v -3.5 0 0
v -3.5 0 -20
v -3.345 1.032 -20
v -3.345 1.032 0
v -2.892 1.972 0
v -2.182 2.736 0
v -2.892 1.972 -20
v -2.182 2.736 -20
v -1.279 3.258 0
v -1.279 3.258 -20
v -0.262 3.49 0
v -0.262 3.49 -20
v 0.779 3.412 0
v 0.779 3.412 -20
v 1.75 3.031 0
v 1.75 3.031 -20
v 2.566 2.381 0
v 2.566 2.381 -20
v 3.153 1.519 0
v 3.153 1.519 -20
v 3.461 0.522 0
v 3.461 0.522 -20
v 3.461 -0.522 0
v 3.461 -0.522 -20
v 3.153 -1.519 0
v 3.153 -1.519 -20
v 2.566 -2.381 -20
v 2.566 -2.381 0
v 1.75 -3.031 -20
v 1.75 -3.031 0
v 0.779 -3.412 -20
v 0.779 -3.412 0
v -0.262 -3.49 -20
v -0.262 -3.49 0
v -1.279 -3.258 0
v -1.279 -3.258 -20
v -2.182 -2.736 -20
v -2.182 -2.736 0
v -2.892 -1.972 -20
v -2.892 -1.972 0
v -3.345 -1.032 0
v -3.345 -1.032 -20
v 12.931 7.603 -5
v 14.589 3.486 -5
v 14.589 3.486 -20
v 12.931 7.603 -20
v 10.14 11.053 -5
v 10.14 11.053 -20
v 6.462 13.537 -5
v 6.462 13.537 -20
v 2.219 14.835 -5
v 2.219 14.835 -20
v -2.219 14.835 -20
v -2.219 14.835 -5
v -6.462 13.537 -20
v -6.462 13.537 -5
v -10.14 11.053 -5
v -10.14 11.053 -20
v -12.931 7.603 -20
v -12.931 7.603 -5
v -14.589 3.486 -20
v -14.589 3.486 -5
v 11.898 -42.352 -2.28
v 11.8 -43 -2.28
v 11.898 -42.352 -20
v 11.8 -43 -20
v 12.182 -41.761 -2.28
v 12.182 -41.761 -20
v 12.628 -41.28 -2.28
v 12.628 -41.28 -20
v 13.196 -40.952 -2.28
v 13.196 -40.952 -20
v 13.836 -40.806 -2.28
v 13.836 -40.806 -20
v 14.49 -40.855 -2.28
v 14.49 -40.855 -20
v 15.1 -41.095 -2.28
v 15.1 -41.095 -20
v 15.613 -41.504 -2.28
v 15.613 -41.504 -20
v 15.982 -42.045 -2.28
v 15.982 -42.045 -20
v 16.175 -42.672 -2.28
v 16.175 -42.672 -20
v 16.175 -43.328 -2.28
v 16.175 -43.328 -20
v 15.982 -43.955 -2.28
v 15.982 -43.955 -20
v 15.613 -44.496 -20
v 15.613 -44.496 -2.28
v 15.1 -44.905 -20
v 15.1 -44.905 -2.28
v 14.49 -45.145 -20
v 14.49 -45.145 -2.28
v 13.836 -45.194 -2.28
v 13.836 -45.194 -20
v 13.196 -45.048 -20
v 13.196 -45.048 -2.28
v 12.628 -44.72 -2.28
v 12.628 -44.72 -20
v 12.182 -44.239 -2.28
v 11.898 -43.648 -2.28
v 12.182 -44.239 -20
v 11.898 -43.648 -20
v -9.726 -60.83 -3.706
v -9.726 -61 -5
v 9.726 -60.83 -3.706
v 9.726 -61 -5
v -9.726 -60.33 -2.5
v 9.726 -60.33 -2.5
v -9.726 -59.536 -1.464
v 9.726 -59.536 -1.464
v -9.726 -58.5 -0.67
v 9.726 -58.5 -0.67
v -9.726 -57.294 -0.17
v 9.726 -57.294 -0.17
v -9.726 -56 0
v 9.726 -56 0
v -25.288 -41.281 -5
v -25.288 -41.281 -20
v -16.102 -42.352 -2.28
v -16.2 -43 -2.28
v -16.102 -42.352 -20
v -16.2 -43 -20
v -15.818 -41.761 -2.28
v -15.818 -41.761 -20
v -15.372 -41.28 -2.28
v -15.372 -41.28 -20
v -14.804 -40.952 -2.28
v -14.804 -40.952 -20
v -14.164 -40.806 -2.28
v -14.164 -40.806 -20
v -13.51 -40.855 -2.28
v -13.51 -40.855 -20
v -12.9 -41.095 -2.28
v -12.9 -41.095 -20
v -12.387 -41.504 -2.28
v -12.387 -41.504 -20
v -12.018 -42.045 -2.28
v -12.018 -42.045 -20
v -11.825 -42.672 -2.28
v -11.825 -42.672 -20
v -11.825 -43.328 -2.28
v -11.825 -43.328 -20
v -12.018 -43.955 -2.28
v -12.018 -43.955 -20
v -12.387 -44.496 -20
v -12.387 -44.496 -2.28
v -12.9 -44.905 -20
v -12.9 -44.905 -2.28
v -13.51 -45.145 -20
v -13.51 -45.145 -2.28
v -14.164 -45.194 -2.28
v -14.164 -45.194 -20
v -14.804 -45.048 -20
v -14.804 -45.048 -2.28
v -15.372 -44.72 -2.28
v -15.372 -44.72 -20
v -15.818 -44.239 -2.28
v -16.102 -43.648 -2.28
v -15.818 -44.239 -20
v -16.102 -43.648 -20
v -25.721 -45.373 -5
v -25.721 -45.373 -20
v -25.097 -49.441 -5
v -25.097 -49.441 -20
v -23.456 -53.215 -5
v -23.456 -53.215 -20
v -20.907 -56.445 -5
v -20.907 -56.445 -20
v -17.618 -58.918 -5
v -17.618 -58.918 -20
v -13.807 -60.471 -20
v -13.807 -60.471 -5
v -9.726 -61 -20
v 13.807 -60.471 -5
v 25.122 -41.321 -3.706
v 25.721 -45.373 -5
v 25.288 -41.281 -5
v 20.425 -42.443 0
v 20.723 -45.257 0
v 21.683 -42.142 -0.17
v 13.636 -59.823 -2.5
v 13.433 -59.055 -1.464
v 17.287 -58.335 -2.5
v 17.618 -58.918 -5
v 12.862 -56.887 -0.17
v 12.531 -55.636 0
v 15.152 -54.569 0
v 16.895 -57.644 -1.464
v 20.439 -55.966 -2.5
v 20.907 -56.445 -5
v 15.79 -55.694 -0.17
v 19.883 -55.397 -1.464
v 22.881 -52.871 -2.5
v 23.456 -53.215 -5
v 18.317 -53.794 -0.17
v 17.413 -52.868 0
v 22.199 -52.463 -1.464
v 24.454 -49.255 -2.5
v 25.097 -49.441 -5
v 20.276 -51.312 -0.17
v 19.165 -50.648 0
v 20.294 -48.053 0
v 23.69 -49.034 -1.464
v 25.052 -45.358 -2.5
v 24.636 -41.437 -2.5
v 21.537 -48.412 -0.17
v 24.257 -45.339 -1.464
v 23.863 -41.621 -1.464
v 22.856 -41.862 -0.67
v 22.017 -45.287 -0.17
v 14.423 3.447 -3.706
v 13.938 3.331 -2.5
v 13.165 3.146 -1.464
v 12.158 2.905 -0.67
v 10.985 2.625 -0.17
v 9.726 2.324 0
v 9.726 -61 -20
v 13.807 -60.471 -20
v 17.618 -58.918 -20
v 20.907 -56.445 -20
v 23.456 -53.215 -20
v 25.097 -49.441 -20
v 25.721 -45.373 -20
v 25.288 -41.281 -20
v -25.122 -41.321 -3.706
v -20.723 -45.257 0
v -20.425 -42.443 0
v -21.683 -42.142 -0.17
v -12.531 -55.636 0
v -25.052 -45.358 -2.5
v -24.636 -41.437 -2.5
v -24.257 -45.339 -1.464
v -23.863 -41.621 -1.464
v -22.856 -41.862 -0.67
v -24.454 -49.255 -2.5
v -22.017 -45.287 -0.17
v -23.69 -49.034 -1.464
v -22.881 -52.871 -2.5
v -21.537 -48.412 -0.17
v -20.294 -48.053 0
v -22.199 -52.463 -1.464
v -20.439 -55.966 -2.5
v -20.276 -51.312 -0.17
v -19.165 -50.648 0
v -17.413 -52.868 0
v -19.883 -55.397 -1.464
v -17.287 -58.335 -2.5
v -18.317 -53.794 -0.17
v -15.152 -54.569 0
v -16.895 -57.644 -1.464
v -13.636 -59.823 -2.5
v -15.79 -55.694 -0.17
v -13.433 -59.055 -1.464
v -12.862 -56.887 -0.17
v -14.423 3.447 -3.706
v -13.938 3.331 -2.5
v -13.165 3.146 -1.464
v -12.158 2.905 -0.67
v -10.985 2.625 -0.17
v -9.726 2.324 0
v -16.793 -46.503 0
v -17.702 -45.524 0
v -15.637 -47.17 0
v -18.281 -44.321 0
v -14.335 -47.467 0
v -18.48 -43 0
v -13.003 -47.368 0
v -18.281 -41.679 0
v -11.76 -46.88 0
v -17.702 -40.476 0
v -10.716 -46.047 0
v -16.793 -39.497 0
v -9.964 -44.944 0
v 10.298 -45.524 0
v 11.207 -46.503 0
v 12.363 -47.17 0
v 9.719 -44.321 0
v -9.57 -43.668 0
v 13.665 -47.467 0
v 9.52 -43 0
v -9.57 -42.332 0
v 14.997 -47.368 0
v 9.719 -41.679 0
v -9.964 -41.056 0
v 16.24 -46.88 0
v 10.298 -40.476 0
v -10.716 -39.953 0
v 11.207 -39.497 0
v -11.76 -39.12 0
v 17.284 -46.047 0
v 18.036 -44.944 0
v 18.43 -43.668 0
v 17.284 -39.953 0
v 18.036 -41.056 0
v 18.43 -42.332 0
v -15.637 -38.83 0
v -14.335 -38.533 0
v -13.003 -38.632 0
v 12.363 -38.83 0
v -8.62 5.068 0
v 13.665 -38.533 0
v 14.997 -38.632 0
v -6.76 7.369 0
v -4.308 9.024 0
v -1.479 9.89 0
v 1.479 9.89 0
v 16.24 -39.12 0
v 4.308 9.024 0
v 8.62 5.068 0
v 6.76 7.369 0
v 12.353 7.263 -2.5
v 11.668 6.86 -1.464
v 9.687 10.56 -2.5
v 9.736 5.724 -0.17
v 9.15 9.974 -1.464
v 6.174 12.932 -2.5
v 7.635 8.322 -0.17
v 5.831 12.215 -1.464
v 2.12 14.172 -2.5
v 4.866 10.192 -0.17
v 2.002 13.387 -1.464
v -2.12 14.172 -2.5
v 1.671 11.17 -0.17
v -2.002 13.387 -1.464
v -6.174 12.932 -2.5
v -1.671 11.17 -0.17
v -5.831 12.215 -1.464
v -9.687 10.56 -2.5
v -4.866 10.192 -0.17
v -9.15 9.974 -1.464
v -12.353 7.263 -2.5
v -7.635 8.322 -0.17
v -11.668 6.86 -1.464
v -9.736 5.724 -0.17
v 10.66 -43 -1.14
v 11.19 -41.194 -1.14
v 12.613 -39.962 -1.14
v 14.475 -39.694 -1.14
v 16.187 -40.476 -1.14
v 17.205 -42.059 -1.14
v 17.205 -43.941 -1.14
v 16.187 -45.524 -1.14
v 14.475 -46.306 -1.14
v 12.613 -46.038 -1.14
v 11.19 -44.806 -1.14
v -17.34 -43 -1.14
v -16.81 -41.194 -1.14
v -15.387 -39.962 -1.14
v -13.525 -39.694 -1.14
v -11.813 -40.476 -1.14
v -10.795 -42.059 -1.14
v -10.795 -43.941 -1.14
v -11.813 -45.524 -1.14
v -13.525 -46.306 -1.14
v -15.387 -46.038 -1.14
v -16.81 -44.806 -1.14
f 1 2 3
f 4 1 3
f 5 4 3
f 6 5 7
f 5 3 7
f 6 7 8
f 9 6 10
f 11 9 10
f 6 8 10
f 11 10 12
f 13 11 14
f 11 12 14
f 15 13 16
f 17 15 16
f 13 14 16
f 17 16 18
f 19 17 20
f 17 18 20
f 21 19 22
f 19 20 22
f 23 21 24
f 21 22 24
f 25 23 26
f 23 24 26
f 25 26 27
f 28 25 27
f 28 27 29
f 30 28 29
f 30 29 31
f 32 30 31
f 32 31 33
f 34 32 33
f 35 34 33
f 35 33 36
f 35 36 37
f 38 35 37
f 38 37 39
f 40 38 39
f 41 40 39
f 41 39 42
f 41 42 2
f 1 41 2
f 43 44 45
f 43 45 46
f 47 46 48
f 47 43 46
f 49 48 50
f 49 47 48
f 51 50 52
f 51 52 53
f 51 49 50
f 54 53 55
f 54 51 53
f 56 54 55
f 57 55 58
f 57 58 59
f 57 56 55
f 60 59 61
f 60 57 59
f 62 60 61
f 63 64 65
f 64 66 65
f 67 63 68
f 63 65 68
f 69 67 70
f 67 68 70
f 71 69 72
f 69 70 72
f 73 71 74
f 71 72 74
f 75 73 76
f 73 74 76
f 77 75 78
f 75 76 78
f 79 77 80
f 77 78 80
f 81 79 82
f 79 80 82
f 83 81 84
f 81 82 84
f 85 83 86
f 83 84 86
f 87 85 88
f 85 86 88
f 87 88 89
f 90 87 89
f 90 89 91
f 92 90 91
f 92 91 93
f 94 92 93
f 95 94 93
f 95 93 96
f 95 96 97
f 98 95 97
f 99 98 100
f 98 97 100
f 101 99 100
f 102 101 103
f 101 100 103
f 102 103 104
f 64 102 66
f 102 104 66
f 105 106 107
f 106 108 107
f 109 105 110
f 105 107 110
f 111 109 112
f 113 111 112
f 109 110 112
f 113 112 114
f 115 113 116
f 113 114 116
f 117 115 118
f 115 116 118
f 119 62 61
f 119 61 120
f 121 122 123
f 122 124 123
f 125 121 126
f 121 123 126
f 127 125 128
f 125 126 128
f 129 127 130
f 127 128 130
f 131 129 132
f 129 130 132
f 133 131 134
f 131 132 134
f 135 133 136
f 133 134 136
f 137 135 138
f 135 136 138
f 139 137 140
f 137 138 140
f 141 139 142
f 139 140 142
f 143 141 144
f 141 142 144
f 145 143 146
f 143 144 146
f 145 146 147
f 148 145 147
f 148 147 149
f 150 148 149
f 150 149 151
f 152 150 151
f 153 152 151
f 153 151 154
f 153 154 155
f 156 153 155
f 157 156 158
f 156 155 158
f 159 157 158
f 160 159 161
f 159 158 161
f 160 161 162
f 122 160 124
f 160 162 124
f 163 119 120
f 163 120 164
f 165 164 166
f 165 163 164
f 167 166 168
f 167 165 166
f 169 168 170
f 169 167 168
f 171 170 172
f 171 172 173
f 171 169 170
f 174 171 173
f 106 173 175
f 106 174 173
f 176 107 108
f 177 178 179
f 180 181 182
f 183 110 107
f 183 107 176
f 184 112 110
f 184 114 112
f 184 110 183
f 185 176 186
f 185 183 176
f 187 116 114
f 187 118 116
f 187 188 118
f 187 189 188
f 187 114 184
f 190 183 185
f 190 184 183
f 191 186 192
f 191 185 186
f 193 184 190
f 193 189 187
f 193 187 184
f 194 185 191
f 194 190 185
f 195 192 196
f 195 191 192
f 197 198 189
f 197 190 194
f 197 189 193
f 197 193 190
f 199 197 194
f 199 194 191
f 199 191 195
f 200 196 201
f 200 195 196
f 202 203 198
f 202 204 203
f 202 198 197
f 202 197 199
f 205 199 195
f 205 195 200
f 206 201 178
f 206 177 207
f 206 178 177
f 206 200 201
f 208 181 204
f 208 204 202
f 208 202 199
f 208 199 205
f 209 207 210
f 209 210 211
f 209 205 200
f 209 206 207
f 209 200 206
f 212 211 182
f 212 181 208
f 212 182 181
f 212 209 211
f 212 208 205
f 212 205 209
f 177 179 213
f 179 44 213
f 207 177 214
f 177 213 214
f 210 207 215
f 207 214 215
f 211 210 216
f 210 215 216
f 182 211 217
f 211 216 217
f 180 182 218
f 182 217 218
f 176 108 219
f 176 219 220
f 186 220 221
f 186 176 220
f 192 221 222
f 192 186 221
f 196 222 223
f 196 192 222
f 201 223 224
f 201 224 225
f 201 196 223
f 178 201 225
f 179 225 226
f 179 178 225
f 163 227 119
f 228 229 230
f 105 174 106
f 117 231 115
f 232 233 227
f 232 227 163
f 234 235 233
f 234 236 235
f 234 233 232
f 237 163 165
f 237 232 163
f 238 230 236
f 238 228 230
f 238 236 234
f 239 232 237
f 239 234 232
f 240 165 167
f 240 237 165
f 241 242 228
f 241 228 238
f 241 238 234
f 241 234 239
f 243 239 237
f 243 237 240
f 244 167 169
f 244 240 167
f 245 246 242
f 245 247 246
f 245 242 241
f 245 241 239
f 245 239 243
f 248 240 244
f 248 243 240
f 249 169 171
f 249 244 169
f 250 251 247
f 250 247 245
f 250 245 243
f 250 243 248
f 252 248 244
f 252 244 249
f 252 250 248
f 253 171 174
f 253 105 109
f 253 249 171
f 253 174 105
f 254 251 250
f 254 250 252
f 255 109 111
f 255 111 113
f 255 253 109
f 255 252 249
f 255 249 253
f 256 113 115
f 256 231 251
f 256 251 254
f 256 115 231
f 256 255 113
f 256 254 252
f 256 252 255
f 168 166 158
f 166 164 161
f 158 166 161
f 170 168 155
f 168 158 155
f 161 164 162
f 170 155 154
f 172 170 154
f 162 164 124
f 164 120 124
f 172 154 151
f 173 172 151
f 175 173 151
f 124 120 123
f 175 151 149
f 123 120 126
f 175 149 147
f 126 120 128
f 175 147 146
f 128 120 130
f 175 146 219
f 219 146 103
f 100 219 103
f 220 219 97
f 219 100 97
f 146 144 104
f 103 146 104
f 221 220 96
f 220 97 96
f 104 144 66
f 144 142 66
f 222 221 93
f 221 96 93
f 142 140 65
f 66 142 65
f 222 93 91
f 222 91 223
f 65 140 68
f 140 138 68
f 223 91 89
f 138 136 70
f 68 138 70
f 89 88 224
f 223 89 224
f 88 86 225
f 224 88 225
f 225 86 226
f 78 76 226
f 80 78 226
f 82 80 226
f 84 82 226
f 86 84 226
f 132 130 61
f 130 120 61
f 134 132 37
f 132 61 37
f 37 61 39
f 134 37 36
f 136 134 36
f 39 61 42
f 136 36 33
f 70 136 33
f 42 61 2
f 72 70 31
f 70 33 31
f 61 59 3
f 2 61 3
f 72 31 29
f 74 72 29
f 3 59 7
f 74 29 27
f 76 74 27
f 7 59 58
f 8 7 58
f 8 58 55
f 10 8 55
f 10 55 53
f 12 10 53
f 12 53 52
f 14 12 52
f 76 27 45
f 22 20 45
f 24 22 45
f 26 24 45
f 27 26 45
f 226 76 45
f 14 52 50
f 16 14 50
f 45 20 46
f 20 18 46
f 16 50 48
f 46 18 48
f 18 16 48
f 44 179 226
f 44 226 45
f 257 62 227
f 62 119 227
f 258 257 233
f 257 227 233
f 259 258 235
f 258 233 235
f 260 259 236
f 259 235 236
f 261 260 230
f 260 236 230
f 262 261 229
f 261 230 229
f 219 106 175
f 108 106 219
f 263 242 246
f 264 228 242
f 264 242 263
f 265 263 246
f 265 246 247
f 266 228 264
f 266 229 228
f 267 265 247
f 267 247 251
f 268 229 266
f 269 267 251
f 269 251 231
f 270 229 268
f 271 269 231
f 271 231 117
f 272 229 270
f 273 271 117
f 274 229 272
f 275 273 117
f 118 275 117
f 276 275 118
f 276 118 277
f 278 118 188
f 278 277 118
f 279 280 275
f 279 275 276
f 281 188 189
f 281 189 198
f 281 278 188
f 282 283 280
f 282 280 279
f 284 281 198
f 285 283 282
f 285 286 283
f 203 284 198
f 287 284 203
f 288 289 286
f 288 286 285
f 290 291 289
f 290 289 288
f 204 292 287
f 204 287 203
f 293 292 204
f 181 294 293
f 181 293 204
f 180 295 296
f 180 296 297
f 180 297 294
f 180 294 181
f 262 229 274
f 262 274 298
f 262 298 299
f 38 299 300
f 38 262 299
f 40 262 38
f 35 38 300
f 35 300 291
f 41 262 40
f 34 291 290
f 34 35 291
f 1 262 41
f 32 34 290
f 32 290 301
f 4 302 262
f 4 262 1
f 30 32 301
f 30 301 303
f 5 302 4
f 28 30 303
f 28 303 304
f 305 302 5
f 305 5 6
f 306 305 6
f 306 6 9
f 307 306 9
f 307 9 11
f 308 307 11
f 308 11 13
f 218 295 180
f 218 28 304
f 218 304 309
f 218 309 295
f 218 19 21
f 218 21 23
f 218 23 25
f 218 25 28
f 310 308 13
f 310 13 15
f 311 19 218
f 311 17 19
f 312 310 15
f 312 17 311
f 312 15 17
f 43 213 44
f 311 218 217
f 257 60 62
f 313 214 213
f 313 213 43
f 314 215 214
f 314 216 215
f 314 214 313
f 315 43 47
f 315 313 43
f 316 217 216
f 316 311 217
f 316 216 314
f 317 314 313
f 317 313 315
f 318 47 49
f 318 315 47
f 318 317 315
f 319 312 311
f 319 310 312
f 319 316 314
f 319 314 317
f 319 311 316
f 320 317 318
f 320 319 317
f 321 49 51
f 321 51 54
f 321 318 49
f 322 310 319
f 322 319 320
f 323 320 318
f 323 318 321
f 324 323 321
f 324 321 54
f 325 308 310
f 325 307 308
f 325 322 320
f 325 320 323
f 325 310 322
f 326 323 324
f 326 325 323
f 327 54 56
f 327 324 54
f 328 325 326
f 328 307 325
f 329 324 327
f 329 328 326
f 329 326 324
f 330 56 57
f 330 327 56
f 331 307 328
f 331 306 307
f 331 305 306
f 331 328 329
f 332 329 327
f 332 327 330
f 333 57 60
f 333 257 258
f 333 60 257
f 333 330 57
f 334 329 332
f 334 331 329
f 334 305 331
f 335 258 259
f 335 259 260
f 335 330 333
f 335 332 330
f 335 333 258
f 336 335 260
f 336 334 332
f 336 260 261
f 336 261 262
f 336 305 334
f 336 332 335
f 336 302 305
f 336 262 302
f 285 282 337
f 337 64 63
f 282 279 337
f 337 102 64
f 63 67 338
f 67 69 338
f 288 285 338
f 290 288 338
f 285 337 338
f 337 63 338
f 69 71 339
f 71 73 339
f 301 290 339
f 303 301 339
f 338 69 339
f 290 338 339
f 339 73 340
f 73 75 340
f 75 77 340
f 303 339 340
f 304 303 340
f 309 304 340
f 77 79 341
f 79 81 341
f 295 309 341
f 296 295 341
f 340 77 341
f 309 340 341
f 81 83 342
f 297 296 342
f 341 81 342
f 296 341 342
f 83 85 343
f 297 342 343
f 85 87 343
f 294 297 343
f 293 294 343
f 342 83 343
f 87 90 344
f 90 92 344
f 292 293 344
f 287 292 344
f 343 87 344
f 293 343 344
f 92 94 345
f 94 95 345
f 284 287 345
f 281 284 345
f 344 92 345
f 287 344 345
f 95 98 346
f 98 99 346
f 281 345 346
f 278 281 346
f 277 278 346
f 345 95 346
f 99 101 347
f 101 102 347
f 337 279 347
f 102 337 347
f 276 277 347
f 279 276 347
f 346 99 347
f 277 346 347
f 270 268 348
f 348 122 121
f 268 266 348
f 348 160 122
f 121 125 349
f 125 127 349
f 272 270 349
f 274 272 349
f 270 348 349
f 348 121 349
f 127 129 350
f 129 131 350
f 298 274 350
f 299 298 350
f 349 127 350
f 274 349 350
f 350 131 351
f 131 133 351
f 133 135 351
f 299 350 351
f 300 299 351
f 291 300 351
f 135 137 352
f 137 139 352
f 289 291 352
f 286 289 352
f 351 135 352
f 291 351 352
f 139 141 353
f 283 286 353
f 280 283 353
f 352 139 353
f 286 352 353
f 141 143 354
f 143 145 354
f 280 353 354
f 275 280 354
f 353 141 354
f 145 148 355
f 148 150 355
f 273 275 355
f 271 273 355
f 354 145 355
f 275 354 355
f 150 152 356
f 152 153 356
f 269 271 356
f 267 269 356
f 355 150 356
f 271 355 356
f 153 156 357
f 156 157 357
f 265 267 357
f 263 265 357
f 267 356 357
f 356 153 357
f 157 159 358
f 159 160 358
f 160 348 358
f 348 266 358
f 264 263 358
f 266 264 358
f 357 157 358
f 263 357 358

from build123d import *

# Parameters (mm, degrees)
F1_DEPTH       = 20
F2_D           = 4.4
F2_CSINK_D     = 8.96
F2_CSINK_ANGLE = 90
F3_R           = 5
F4_D           = 7


# Not quite as in the source:
# - a feature names something its author has since deleted; it is built from what else it names


with BuildPart() as f1:
    # F0 (on Top) → F1 (new body)
    with BuildSketch(Plane.XY):
        with BuildLine():
            Line((-9.7258236175, -61), (9.7258236175, -61))
            ThreePointArc((9.7258236175, -61), (22.2857339512, -54.9120458236), (25.2876244635, -41.2810815511))
            Line((25.2876244635, -41.2810815511), (14.5891882931, 3.4864860458))
            ThreePointArc((14.5891882931, 3.4864860458), (0, 15), (-14.5891882931, 3.4864860458))
            Line((-14.5891882931, 3.4864860458), (-25.2876244635, -41.2810815511))
            ThreePointArc((-25.2876244635, -41.2810815511), (-22.2857339512, -54.9120458236), (-9.7258236175, -61))
        make_face()
    extrude(amount=-F1_DEPTH)

    # F2 (through all)
    with Locations(Plane.XY):
        with Locations((-14, -43), (14, -43)):
            CounterSinkHole(F2_D / 2, F2_CSINK_D / 2, counter_sink_angle=F2_CSINK_ANGLE)

    # F3
    f3_edges = [f1.edges().sort_by_distance(p)[0] for p in [
        (0, -61, 0),
        (-19.938406, -18.897298, 0),
        (19.938406, -18.897298, 0),
    ]]
    fillet(f3_edges, radius=F3_R)

    # F4 (through all)
    with Locations(Plane.XY):
        with Locations((0, 0)):
            Hole(F4_D / 2)


solid = f1.part
